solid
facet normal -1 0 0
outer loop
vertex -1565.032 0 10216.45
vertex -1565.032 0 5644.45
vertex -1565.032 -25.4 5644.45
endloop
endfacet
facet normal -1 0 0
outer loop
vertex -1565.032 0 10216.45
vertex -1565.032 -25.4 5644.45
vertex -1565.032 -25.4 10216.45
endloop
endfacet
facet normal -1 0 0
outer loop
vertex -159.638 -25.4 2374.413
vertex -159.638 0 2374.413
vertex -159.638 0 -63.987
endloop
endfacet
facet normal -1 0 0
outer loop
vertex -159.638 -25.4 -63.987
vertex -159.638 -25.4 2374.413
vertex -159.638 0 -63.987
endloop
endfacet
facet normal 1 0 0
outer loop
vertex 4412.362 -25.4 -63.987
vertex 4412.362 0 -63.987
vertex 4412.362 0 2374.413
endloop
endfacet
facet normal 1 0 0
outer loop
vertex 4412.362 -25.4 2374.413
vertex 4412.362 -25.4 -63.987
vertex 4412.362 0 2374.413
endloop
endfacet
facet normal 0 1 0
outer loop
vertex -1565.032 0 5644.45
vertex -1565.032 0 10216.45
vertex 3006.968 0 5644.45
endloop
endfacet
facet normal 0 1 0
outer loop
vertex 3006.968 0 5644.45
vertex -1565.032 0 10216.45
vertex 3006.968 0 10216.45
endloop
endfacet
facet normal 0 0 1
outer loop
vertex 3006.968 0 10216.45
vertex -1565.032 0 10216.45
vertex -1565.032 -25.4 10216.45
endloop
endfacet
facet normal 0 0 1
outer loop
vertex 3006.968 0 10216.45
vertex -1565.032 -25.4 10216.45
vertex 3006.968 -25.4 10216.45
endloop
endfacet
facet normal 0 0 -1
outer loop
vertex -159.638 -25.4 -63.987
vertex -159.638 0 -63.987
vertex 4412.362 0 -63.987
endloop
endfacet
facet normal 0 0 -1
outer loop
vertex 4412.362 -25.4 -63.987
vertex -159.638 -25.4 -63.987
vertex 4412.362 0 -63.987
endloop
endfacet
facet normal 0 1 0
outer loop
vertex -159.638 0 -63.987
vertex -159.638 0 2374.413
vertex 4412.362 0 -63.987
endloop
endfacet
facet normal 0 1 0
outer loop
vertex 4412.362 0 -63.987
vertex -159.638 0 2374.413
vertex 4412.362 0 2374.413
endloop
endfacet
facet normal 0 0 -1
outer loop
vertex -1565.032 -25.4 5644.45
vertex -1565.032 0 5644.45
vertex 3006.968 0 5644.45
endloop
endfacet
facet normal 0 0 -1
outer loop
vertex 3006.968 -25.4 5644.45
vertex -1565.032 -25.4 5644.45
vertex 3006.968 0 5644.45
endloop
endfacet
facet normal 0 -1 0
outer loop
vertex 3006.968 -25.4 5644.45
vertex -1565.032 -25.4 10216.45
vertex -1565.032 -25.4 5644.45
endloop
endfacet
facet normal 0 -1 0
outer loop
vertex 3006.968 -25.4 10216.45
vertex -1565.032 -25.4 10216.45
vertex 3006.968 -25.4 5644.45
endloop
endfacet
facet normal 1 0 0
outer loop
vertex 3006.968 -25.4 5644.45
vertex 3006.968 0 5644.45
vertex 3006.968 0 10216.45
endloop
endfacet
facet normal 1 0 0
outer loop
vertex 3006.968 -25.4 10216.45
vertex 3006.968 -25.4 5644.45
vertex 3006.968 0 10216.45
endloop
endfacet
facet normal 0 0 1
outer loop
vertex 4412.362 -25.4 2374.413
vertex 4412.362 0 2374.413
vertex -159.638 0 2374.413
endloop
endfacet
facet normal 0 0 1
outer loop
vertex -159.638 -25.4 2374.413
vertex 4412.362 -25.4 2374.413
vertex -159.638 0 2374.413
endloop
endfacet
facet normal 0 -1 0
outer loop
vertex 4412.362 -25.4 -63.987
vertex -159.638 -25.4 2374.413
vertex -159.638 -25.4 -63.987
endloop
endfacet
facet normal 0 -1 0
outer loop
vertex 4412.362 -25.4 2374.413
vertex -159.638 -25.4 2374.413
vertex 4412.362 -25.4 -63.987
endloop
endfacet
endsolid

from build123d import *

# Parameters (mm, degrees)
F0_W     = 4572
F0_H     = 4572
F1_DEPTH = 25.4
F2_DEPTH = 25.4


with BuildPart() as f1:
    # F0 (on Front) → F1 (new body)
    with BuildSketch(Plane.XZ):
        Polygon((4412.361914, 2374.412715), (-159.638086, 2374.412715), (-159.638086, 2171.212715), (-159.638086, -63.987285), (4412.361914, -63.987285), align=None)
        with Locations((720.967875, 7930.449711)):
            Rectangle(F0_W, F0_H)
    extrude(amount=F1_DEPTH)

    # F0 (on Front) → F2 (join)
    with BuildSketch(Plane.XZ):
        with Locations((720.967875, 7930.449711)):
            Rectangle(F0_W, F0_H)
    extrude(amount=F2_DEPTH)


solid = f1.part
